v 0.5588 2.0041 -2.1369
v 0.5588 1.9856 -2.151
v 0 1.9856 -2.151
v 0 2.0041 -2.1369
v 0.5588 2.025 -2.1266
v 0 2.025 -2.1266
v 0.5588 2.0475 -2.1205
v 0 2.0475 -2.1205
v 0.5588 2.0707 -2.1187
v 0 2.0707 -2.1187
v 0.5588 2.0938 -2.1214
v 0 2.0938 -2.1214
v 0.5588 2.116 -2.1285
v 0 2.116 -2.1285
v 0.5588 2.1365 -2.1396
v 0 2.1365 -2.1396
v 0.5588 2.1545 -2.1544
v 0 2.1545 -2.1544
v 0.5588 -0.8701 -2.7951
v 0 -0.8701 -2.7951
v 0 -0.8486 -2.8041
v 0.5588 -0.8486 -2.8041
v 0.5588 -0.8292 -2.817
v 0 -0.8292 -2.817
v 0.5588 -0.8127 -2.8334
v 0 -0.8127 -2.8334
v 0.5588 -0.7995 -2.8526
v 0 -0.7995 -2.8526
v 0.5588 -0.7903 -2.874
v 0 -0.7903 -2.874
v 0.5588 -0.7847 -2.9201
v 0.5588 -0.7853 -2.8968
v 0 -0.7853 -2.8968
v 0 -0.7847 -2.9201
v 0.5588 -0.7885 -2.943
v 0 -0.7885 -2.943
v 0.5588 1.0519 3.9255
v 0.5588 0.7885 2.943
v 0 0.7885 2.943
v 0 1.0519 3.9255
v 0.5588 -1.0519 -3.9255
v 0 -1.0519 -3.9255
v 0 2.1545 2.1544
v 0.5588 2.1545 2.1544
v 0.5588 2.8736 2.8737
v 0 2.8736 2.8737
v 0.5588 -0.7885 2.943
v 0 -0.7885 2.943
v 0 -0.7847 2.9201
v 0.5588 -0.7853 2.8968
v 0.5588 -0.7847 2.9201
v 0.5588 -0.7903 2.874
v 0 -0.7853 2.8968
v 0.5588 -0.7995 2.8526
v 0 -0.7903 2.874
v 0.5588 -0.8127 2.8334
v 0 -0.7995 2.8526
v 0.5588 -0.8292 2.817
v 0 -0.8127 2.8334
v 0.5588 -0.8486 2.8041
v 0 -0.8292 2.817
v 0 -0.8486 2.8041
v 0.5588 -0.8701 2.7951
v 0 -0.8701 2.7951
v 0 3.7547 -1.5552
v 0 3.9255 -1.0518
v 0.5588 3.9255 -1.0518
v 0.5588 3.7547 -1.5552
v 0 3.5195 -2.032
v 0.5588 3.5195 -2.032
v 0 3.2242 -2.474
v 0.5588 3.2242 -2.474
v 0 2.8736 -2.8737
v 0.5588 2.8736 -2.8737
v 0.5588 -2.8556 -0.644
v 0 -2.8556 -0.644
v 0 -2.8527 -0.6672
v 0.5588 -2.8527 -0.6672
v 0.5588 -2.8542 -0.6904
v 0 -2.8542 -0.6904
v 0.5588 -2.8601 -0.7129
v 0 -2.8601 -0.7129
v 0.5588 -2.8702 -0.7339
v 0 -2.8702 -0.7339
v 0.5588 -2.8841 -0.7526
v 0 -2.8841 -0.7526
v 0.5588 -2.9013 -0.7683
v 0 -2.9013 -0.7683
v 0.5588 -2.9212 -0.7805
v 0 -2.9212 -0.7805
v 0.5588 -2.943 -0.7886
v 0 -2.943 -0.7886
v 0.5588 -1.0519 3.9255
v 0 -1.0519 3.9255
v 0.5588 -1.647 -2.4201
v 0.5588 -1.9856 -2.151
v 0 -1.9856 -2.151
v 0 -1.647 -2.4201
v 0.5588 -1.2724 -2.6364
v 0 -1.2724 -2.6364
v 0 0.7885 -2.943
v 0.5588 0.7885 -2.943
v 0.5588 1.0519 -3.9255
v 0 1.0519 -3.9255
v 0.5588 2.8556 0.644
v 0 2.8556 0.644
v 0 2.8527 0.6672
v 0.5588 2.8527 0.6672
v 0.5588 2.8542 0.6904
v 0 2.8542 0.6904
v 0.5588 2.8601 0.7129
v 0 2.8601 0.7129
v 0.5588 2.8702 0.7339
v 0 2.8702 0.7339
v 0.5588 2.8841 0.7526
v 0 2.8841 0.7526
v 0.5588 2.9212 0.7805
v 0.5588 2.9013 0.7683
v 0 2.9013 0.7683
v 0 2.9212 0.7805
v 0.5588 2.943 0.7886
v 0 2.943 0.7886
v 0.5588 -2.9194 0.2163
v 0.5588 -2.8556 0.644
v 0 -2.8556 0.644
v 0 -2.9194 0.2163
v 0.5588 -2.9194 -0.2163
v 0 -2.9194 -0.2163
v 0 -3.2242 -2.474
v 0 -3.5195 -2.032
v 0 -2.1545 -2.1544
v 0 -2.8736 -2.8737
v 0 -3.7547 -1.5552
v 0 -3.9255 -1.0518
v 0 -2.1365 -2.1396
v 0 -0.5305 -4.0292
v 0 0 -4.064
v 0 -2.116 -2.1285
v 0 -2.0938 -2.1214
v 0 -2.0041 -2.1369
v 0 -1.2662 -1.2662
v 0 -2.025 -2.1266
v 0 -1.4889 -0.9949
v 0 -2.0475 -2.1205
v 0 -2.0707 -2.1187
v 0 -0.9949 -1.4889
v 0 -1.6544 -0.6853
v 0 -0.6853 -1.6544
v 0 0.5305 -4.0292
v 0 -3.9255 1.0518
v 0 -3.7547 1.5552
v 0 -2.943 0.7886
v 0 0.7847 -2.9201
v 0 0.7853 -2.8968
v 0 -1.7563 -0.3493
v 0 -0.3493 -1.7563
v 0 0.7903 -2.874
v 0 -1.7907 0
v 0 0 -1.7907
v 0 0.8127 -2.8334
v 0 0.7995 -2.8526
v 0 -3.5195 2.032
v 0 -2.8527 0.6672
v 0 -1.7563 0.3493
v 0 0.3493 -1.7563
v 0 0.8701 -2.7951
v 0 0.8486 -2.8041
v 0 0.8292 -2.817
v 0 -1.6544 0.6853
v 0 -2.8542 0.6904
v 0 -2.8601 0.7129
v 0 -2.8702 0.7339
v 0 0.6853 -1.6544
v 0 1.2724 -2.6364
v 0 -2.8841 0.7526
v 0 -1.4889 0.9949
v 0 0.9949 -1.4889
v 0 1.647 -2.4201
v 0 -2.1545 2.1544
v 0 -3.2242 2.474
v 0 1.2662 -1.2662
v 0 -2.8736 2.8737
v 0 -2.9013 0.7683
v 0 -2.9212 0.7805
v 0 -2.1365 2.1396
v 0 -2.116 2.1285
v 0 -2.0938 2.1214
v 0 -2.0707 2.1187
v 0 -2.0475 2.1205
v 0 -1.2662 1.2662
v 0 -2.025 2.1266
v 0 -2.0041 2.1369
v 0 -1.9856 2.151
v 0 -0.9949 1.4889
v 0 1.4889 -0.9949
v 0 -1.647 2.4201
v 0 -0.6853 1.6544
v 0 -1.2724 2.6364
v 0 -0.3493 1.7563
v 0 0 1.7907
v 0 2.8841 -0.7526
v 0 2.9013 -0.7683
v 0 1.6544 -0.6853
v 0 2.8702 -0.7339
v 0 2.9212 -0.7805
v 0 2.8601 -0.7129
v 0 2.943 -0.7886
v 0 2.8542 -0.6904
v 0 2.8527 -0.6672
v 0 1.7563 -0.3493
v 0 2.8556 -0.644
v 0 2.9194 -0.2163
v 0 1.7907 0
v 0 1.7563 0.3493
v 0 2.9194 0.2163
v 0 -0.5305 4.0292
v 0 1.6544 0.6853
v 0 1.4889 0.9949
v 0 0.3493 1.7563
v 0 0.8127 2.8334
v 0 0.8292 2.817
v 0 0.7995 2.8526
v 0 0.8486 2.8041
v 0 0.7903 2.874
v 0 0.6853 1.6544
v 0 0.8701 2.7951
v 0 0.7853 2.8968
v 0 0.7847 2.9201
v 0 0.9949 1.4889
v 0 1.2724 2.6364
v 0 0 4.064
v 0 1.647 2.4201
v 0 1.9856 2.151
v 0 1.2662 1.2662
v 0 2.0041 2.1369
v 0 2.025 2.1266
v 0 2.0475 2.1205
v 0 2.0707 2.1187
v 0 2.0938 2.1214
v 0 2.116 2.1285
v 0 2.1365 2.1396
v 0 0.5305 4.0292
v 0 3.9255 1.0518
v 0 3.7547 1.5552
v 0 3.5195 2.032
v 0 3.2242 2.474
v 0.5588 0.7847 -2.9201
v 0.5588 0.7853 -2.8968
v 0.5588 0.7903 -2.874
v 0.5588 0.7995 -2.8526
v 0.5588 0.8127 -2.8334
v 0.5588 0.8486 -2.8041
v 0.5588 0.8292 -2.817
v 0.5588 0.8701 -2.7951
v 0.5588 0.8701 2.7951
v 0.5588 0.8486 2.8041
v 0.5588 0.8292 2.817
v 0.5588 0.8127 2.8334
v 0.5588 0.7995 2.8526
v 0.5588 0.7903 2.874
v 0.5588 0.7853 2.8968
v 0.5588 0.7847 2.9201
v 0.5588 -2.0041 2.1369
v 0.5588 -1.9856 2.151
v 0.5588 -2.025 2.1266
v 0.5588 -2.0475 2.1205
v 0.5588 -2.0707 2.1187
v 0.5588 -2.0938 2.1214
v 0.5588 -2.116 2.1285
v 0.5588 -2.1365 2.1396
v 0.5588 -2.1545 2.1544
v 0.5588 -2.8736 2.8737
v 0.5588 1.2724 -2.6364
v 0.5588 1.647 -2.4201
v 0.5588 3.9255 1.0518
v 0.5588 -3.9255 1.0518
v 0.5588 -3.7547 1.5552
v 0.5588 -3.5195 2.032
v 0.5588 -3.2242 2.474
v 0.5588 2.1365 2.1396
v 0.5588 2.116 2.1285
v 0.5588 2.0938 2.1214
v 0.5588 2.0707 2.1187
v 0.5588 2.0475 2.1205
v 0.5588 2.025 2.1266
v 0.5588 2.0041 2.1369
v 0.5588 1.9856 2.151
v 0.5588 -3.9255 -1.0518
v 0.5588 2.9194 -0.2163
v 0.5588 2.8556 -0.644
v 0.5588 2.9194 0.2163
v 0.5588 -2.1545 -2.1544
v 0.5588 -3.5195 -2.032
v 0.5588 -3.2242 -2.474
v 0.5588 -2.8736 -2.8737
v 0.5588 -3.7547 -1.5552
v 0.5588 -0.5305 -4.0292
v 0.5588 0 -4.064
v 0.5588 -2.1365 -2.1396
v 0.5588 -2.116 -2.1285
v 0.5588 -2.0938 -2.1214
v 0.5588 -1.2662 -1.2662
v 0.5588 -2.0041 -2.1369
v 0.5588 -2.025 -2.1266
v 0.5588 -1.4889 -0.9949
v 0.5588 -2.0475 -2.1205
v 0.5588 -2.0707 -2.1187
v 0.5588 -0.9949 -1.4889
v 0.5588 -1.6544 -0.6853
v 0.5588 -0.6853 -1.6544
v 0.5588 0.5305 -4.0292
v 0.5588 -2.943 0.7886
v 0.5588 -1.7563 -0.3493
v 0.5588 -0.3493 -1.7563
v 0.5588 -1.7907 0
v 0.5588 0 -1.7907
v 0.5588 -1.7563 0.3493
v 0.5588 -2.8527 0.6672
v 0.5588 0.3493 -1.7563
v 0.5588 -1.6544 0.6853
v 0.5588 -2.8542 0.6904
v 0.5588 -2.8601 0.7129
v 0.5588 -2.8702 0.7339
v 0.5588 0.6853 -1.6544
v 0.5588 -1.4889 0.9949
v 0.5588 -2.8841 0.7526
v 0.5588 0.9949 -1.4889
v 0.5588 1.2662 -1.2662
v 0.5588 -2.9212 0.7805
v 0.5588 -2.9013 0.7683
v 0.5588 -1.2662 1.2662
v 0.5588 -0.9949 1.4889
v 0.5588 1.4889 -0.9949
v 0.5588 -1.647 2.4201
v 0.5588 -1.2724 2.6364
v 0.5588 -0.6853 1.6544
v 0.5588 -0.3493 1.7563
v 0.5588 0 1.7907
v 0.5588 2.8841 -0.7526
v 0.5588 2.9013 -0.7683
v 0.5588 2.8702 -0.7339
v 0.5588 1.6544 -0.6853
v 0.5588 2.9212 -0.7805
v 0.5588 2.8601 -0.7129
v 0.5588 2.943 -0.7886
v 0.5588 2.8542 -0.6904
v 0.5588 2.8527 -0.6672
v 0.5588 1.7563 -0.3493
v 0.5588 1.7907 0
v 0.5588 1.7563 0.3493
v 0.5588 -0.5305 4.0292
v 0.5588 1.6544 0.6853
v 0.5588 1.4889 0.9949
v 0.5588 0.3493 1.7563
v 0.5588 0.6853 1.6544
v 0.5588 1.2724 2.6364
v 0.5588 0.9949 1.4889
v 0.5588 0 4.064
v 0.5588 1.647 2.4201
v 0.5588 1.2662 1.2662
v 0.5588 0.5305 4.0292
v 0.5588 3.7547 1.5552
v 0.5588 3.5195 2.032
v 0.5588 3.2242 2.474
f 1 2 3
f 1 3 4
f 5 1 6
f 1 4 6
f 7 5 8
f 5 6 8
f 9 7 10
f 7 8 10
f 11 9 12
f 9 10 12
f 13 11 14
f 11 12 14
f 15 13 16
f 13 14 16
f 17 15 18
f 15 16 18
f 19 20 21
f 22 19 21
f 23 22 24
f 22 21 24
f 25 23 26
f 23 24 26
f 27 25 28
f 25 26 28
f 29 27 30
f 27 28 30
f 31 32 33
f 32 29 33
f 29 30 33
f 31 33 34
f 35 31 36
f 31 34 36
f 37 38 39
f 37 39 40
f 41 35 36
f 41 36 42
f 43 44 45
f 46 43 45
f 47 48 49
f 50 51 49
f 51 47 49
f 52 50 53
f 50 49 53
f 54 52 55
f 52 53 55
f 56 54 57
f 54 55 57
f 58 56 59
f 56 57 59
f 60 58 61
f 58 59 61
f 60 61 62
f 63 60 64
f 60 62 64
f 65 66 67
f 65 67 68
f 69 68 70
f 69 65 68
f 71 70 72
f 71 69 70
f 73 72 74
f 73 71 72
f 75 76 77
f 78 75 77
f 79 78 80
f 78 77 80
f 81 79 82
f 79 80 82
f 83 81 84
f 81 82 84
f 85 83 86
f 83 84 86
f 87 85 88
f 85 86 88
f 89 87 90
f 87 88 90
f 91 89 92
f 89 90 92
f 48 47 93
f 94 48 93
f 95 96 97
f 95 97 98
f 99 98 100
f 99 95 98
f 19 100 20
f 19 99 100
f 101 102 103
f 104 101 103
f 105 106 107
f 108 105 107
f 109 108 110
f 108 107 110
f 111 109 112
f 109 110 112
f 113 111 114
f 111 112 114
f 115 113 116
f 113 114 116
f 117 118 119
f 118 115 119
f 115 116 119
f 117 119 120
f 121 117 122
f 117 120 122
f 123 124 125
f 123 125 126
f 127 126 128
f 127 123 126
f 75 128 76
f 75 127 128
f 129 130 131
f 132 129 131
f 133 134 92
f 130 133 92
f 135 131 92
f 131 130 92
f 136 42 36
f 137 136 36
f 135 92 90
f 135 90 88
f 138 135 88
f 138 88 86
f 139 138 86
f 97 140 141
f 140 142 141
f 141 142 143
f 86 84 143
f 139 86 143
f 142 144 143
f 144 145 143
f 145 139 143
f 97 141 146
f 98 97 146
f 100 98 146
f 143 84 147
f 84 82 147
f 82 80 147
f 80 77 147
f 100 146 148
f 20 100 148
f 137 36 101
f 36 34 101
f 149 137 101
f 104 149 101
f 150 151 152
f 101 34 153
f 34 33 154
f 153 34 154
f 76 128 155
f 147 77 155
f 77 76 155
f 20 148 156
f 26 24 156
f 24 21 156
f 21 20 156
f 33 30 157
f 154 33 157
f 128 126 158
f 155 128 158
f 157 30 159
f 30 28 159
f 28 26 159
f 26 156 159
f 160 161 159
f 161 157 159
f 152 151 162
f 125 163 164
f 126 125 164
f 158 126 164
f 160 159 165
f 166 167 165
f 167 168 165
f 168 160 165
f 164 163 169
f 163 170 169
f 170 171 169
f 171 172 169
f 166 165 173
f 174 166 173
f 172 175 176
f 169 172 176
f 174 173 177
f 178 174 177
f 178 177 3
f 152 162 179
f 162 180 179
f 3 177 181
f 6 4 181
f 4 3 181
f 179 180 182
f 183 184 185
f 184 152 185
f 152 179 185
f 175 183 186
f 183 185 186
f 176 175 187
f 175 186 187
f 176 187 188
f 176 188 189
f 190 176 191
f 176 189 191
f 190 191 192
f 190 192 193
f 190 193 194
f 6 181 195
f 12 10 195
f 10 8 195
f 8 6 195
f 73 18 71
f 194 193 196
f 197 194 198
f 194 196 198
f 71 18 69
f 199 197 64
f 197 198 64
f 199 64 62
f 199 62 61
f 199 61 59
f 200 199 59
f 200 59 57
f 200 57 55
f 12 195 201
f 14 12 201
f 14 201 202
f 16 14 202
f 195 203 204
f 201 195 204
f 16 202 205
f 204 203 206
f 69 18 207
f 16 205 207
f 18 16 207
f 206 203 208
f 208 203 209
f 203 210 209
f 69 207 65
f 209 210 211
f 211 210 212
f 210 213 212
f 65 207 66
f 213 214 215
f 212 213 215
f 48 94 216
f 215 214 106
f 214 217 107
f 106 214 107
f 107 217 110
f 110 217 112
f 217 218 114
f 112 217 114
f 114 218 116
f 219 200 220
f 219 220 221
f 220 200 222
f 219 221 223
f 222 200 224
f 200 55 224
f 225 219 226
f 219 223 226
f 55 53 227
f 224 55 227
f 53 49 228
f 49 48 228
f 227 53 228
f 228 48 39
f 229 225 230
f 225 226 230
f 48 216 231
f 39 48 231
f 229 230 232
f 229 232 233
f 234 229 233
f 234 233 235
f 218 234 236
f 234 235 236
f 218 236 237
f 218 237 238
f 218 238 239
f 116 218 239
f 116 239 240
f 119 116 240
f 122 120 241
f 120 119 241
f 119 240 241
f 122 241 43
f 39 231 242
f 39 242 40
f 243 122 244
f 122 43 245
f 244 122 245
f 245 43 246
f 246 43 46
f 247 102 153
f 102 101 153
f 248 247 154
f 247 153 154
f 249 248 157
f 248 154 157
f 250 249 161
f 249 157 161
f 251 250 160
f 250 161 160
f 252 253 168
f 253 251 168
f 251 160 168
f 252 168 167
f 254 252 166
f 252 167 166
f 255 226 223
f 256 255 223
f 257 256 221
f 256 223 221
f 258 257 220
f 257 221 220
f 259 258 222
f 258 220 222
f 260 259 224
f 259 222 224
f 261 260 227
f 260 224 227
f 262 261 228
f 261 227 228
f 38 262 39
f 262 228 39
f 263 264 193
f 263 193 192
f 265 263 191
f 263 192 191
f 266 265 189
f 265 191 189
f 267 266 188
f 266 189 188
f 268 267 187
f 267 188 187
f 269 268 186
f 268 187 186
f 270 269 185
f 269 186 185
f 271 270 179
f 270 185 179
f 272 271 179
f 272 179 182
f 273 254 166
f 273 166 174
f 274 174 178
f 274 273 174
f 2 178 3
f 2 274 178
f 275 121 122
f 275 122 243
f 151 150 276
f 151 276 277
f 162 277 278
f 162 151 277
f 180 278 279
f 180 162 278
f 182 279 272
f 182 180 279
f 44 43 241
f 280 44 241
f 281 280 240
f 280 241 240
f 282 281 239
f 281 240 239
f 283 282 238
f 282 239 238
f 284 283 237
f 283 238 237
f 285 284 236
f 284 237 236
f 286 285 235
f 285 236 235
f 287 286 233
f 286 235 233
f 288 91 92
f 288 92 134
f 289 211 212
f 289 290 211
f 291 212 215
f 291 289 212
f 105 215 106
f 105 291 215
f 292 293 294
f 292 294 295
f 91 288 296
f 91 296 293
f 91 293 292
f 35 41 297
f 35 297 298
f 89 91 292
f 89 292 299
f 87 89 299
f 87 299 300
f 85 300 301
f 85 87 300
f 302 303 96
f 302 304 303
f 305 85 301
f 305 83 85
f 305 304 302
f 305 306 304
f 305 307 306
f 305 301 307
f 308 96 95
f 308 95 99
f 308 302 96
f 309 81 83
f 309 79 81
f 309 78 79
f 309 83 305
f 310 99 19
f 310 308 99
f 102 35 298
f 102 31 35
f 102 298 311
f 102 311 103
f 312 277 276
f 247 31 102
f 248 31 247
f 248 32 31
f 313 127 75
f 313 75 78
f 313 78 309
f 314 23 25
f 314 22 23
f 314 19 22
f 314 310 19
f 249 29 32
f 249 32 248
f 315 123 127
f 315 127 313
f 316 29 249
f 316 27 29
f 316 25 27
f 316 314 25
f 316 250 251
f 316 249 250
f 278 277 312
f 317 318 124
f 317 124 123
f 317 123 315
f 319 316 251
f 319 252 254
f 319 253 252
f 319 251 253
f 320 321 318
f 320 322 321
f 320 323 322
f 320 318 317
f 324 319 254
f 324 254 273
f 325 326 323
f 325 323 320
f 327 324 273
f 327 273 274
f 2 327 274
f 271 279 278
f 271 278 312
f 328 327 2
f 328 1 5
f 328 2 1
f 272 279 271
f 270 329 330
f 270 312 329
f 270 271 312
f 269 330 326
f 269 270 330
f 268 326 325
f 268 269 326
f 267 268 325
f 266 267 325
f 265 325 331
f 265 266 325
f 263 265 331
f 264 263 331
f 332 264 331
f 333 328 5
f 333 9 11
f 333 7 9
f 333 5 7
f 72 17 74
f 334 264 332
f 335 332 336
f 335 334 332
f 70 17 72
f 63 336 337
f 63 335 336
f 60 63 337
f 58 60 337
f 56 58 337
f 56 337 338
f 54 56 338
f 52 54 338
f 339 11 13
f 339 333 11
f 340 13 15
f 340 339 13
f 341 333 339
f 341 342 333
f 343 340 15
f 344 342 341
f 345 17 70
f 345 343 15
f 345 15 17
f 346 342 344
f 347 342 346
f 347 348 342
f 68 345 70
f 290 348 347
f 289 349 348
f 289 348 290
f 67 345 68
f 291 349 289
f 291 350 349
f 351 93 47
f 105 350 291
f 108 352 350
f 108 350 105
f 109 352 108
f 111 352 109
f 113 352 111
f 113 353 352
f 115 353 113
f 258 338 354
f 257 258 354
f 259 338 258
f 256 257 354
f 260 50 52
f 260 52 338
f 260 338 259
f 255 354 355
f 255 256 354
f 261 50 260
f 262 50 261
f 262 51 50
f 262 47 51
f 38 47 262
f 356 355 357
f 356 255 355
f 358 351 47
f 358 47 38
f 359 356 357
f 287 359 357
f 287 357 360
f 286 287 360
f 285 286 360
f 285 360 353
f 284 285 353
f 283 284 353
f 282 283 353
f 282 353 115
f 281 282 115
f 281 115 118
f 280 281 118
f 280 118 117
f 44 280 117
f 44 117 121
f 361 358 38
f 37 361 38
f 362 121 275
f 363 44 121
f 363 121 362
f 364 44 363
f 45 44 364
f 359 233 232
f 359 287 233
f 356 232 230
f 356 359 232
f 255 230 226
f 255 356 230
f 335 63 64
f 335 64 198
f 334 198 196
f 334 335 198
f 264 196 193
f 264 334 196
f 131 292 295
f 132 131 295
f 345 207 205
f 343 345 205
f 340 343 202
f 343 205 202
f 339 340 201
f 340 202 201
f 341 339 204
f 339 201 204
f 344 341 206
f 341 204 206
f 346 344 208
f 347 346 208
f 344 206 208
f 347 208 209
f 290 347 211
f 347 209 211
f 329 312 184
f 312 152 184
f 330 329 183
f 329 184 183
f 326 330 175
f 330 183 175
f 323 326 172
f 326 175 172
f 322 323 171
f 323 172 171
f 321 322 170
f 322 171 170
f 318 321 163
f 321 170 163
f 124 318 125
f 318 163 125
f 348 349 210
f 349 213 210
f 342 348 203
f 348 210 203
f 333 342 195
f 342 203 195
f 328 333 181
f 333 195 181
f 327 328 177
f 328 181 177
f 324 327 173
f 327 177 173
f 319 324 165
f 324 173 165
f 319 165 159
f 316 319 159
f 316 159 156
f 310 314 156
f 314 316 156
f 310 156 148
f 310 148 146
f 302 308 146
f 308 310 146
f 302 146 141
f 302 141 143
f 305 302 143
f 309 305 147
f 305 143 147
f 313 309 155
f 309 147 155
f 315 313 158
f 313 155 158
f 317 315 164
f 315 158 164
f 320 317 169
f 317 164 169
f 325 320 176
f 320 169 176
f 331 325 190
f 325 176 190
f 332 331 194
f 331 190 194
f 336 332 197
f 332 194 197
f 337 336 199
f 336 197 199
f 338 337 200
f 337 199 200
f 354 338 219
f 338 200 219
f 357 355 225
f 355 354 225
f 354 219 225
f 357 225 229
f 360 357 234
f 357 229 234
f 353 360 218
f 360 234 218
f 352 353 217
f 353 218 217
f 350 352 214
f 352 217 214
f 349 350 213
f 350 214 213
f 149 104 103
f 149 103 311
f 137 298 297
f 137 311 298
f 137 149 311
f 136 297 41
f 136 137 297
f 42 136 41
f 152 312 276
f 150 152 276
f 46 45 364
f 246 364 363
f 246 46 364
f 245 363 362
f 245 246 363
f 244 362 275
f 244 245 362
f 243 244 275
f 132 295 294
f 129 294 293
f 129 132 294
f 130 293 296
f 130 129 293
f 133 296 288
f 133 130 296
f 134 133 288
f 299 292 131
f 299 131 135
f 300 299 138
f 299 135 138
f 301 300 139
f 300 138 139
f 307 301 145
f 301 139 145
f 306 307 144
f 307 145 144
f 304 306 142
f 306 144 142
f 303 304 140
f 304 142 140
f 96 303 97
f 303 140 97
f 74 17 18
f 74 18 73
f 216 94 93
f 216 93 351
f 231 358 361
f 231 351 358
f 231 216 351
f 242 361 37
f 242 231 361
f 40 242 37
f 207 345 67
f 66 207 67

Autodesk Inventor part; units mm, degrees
ref_plane "YZ Plane" through (0, 0, 0) normal (1, 0, 0) x (0, 1, 0)
ref_plane "XZ Plane" through (0, 0, 0) normal (0, 1, 0) x (-1, 0, 0)
sketch "Sketch1" plane through (0, 0, 0) normal (1, 0, 0) x (0, 1, 0)
  circle A0 centre (0, 0) radius 4.064
  circle A1 centre (0, 0) radius 1.7907
  dimension "d0" = 8.128
  dimension "d1" = 3.5814
extrude "Body" add sketch "Sketch1" along normal blind 0.5588
sketch "Sketch2" plane through (0.5588, 0, 0) normal (1, 0, 0) x (0, 0, -1)
  circle A0 centre (0, 0) radius 4.064 projected
  line L0 (0, 0) -> (0, 4.064) construction
  arc A1 (1.0518, 3.9255) -> (-1.0518, 3.9255) centre (0, 0) ccw
  arc A2 (0.7577, 2.8276) -> (-0.7577, 2.8276) centre (0, 0) ccw
  line L1 (-0.7577, 2.8276) -> (-1.0518, 3.9255)
  line L2 (0.7577, 2.8276) -> (1.0518, 3.9255)
  line L3 (-0.7577, 2.8276) -> (0, 0) construction
  line L4 (0, 0) -> (0.7577, 2.8276) construction
  dimension "d4" = 30
  dimension "d5" = 5.8547
extrude "Cut" cut sketch "Sketch2" against normal through all contours L2 A2 L1 A0 picked at (0.0851, 3.6711)
fillet "Fillet1" radius 0.1219 2 edges at (0.2794, 2.8276, 0.7577) (0.2794, 2.8276, -0.7577)
pattern_circular "Cuts" count 6 over 360 about axis through (0, 0, 0) along (1, 0, 0) of "Cut", "Fillet1"
ref_plane "Work Plane1" through (0, 0, 0) normal (0, -1, 0) x (1, 0, 0)
equation "\"d0\" = SD2"
equation "\"d1\" = SD1"
equation "\"d2\" = SD"
equation "\"d5\" = 0.5 * SD2 + 0.5 * SD1"
equation "\"d6\" = SD"
equation "\"d8\" = 0.015 * SD2"
equation "\"SD\" = 0.5588"
equation "\"SD1\" = 3.5814"
equation "\"SD2\" = 8.128"
equation "\"NND\" = 3.5052"
properties part number "ASME B18.21.1 - No. 6. Carbon Steel" material "Steel, Mild"
